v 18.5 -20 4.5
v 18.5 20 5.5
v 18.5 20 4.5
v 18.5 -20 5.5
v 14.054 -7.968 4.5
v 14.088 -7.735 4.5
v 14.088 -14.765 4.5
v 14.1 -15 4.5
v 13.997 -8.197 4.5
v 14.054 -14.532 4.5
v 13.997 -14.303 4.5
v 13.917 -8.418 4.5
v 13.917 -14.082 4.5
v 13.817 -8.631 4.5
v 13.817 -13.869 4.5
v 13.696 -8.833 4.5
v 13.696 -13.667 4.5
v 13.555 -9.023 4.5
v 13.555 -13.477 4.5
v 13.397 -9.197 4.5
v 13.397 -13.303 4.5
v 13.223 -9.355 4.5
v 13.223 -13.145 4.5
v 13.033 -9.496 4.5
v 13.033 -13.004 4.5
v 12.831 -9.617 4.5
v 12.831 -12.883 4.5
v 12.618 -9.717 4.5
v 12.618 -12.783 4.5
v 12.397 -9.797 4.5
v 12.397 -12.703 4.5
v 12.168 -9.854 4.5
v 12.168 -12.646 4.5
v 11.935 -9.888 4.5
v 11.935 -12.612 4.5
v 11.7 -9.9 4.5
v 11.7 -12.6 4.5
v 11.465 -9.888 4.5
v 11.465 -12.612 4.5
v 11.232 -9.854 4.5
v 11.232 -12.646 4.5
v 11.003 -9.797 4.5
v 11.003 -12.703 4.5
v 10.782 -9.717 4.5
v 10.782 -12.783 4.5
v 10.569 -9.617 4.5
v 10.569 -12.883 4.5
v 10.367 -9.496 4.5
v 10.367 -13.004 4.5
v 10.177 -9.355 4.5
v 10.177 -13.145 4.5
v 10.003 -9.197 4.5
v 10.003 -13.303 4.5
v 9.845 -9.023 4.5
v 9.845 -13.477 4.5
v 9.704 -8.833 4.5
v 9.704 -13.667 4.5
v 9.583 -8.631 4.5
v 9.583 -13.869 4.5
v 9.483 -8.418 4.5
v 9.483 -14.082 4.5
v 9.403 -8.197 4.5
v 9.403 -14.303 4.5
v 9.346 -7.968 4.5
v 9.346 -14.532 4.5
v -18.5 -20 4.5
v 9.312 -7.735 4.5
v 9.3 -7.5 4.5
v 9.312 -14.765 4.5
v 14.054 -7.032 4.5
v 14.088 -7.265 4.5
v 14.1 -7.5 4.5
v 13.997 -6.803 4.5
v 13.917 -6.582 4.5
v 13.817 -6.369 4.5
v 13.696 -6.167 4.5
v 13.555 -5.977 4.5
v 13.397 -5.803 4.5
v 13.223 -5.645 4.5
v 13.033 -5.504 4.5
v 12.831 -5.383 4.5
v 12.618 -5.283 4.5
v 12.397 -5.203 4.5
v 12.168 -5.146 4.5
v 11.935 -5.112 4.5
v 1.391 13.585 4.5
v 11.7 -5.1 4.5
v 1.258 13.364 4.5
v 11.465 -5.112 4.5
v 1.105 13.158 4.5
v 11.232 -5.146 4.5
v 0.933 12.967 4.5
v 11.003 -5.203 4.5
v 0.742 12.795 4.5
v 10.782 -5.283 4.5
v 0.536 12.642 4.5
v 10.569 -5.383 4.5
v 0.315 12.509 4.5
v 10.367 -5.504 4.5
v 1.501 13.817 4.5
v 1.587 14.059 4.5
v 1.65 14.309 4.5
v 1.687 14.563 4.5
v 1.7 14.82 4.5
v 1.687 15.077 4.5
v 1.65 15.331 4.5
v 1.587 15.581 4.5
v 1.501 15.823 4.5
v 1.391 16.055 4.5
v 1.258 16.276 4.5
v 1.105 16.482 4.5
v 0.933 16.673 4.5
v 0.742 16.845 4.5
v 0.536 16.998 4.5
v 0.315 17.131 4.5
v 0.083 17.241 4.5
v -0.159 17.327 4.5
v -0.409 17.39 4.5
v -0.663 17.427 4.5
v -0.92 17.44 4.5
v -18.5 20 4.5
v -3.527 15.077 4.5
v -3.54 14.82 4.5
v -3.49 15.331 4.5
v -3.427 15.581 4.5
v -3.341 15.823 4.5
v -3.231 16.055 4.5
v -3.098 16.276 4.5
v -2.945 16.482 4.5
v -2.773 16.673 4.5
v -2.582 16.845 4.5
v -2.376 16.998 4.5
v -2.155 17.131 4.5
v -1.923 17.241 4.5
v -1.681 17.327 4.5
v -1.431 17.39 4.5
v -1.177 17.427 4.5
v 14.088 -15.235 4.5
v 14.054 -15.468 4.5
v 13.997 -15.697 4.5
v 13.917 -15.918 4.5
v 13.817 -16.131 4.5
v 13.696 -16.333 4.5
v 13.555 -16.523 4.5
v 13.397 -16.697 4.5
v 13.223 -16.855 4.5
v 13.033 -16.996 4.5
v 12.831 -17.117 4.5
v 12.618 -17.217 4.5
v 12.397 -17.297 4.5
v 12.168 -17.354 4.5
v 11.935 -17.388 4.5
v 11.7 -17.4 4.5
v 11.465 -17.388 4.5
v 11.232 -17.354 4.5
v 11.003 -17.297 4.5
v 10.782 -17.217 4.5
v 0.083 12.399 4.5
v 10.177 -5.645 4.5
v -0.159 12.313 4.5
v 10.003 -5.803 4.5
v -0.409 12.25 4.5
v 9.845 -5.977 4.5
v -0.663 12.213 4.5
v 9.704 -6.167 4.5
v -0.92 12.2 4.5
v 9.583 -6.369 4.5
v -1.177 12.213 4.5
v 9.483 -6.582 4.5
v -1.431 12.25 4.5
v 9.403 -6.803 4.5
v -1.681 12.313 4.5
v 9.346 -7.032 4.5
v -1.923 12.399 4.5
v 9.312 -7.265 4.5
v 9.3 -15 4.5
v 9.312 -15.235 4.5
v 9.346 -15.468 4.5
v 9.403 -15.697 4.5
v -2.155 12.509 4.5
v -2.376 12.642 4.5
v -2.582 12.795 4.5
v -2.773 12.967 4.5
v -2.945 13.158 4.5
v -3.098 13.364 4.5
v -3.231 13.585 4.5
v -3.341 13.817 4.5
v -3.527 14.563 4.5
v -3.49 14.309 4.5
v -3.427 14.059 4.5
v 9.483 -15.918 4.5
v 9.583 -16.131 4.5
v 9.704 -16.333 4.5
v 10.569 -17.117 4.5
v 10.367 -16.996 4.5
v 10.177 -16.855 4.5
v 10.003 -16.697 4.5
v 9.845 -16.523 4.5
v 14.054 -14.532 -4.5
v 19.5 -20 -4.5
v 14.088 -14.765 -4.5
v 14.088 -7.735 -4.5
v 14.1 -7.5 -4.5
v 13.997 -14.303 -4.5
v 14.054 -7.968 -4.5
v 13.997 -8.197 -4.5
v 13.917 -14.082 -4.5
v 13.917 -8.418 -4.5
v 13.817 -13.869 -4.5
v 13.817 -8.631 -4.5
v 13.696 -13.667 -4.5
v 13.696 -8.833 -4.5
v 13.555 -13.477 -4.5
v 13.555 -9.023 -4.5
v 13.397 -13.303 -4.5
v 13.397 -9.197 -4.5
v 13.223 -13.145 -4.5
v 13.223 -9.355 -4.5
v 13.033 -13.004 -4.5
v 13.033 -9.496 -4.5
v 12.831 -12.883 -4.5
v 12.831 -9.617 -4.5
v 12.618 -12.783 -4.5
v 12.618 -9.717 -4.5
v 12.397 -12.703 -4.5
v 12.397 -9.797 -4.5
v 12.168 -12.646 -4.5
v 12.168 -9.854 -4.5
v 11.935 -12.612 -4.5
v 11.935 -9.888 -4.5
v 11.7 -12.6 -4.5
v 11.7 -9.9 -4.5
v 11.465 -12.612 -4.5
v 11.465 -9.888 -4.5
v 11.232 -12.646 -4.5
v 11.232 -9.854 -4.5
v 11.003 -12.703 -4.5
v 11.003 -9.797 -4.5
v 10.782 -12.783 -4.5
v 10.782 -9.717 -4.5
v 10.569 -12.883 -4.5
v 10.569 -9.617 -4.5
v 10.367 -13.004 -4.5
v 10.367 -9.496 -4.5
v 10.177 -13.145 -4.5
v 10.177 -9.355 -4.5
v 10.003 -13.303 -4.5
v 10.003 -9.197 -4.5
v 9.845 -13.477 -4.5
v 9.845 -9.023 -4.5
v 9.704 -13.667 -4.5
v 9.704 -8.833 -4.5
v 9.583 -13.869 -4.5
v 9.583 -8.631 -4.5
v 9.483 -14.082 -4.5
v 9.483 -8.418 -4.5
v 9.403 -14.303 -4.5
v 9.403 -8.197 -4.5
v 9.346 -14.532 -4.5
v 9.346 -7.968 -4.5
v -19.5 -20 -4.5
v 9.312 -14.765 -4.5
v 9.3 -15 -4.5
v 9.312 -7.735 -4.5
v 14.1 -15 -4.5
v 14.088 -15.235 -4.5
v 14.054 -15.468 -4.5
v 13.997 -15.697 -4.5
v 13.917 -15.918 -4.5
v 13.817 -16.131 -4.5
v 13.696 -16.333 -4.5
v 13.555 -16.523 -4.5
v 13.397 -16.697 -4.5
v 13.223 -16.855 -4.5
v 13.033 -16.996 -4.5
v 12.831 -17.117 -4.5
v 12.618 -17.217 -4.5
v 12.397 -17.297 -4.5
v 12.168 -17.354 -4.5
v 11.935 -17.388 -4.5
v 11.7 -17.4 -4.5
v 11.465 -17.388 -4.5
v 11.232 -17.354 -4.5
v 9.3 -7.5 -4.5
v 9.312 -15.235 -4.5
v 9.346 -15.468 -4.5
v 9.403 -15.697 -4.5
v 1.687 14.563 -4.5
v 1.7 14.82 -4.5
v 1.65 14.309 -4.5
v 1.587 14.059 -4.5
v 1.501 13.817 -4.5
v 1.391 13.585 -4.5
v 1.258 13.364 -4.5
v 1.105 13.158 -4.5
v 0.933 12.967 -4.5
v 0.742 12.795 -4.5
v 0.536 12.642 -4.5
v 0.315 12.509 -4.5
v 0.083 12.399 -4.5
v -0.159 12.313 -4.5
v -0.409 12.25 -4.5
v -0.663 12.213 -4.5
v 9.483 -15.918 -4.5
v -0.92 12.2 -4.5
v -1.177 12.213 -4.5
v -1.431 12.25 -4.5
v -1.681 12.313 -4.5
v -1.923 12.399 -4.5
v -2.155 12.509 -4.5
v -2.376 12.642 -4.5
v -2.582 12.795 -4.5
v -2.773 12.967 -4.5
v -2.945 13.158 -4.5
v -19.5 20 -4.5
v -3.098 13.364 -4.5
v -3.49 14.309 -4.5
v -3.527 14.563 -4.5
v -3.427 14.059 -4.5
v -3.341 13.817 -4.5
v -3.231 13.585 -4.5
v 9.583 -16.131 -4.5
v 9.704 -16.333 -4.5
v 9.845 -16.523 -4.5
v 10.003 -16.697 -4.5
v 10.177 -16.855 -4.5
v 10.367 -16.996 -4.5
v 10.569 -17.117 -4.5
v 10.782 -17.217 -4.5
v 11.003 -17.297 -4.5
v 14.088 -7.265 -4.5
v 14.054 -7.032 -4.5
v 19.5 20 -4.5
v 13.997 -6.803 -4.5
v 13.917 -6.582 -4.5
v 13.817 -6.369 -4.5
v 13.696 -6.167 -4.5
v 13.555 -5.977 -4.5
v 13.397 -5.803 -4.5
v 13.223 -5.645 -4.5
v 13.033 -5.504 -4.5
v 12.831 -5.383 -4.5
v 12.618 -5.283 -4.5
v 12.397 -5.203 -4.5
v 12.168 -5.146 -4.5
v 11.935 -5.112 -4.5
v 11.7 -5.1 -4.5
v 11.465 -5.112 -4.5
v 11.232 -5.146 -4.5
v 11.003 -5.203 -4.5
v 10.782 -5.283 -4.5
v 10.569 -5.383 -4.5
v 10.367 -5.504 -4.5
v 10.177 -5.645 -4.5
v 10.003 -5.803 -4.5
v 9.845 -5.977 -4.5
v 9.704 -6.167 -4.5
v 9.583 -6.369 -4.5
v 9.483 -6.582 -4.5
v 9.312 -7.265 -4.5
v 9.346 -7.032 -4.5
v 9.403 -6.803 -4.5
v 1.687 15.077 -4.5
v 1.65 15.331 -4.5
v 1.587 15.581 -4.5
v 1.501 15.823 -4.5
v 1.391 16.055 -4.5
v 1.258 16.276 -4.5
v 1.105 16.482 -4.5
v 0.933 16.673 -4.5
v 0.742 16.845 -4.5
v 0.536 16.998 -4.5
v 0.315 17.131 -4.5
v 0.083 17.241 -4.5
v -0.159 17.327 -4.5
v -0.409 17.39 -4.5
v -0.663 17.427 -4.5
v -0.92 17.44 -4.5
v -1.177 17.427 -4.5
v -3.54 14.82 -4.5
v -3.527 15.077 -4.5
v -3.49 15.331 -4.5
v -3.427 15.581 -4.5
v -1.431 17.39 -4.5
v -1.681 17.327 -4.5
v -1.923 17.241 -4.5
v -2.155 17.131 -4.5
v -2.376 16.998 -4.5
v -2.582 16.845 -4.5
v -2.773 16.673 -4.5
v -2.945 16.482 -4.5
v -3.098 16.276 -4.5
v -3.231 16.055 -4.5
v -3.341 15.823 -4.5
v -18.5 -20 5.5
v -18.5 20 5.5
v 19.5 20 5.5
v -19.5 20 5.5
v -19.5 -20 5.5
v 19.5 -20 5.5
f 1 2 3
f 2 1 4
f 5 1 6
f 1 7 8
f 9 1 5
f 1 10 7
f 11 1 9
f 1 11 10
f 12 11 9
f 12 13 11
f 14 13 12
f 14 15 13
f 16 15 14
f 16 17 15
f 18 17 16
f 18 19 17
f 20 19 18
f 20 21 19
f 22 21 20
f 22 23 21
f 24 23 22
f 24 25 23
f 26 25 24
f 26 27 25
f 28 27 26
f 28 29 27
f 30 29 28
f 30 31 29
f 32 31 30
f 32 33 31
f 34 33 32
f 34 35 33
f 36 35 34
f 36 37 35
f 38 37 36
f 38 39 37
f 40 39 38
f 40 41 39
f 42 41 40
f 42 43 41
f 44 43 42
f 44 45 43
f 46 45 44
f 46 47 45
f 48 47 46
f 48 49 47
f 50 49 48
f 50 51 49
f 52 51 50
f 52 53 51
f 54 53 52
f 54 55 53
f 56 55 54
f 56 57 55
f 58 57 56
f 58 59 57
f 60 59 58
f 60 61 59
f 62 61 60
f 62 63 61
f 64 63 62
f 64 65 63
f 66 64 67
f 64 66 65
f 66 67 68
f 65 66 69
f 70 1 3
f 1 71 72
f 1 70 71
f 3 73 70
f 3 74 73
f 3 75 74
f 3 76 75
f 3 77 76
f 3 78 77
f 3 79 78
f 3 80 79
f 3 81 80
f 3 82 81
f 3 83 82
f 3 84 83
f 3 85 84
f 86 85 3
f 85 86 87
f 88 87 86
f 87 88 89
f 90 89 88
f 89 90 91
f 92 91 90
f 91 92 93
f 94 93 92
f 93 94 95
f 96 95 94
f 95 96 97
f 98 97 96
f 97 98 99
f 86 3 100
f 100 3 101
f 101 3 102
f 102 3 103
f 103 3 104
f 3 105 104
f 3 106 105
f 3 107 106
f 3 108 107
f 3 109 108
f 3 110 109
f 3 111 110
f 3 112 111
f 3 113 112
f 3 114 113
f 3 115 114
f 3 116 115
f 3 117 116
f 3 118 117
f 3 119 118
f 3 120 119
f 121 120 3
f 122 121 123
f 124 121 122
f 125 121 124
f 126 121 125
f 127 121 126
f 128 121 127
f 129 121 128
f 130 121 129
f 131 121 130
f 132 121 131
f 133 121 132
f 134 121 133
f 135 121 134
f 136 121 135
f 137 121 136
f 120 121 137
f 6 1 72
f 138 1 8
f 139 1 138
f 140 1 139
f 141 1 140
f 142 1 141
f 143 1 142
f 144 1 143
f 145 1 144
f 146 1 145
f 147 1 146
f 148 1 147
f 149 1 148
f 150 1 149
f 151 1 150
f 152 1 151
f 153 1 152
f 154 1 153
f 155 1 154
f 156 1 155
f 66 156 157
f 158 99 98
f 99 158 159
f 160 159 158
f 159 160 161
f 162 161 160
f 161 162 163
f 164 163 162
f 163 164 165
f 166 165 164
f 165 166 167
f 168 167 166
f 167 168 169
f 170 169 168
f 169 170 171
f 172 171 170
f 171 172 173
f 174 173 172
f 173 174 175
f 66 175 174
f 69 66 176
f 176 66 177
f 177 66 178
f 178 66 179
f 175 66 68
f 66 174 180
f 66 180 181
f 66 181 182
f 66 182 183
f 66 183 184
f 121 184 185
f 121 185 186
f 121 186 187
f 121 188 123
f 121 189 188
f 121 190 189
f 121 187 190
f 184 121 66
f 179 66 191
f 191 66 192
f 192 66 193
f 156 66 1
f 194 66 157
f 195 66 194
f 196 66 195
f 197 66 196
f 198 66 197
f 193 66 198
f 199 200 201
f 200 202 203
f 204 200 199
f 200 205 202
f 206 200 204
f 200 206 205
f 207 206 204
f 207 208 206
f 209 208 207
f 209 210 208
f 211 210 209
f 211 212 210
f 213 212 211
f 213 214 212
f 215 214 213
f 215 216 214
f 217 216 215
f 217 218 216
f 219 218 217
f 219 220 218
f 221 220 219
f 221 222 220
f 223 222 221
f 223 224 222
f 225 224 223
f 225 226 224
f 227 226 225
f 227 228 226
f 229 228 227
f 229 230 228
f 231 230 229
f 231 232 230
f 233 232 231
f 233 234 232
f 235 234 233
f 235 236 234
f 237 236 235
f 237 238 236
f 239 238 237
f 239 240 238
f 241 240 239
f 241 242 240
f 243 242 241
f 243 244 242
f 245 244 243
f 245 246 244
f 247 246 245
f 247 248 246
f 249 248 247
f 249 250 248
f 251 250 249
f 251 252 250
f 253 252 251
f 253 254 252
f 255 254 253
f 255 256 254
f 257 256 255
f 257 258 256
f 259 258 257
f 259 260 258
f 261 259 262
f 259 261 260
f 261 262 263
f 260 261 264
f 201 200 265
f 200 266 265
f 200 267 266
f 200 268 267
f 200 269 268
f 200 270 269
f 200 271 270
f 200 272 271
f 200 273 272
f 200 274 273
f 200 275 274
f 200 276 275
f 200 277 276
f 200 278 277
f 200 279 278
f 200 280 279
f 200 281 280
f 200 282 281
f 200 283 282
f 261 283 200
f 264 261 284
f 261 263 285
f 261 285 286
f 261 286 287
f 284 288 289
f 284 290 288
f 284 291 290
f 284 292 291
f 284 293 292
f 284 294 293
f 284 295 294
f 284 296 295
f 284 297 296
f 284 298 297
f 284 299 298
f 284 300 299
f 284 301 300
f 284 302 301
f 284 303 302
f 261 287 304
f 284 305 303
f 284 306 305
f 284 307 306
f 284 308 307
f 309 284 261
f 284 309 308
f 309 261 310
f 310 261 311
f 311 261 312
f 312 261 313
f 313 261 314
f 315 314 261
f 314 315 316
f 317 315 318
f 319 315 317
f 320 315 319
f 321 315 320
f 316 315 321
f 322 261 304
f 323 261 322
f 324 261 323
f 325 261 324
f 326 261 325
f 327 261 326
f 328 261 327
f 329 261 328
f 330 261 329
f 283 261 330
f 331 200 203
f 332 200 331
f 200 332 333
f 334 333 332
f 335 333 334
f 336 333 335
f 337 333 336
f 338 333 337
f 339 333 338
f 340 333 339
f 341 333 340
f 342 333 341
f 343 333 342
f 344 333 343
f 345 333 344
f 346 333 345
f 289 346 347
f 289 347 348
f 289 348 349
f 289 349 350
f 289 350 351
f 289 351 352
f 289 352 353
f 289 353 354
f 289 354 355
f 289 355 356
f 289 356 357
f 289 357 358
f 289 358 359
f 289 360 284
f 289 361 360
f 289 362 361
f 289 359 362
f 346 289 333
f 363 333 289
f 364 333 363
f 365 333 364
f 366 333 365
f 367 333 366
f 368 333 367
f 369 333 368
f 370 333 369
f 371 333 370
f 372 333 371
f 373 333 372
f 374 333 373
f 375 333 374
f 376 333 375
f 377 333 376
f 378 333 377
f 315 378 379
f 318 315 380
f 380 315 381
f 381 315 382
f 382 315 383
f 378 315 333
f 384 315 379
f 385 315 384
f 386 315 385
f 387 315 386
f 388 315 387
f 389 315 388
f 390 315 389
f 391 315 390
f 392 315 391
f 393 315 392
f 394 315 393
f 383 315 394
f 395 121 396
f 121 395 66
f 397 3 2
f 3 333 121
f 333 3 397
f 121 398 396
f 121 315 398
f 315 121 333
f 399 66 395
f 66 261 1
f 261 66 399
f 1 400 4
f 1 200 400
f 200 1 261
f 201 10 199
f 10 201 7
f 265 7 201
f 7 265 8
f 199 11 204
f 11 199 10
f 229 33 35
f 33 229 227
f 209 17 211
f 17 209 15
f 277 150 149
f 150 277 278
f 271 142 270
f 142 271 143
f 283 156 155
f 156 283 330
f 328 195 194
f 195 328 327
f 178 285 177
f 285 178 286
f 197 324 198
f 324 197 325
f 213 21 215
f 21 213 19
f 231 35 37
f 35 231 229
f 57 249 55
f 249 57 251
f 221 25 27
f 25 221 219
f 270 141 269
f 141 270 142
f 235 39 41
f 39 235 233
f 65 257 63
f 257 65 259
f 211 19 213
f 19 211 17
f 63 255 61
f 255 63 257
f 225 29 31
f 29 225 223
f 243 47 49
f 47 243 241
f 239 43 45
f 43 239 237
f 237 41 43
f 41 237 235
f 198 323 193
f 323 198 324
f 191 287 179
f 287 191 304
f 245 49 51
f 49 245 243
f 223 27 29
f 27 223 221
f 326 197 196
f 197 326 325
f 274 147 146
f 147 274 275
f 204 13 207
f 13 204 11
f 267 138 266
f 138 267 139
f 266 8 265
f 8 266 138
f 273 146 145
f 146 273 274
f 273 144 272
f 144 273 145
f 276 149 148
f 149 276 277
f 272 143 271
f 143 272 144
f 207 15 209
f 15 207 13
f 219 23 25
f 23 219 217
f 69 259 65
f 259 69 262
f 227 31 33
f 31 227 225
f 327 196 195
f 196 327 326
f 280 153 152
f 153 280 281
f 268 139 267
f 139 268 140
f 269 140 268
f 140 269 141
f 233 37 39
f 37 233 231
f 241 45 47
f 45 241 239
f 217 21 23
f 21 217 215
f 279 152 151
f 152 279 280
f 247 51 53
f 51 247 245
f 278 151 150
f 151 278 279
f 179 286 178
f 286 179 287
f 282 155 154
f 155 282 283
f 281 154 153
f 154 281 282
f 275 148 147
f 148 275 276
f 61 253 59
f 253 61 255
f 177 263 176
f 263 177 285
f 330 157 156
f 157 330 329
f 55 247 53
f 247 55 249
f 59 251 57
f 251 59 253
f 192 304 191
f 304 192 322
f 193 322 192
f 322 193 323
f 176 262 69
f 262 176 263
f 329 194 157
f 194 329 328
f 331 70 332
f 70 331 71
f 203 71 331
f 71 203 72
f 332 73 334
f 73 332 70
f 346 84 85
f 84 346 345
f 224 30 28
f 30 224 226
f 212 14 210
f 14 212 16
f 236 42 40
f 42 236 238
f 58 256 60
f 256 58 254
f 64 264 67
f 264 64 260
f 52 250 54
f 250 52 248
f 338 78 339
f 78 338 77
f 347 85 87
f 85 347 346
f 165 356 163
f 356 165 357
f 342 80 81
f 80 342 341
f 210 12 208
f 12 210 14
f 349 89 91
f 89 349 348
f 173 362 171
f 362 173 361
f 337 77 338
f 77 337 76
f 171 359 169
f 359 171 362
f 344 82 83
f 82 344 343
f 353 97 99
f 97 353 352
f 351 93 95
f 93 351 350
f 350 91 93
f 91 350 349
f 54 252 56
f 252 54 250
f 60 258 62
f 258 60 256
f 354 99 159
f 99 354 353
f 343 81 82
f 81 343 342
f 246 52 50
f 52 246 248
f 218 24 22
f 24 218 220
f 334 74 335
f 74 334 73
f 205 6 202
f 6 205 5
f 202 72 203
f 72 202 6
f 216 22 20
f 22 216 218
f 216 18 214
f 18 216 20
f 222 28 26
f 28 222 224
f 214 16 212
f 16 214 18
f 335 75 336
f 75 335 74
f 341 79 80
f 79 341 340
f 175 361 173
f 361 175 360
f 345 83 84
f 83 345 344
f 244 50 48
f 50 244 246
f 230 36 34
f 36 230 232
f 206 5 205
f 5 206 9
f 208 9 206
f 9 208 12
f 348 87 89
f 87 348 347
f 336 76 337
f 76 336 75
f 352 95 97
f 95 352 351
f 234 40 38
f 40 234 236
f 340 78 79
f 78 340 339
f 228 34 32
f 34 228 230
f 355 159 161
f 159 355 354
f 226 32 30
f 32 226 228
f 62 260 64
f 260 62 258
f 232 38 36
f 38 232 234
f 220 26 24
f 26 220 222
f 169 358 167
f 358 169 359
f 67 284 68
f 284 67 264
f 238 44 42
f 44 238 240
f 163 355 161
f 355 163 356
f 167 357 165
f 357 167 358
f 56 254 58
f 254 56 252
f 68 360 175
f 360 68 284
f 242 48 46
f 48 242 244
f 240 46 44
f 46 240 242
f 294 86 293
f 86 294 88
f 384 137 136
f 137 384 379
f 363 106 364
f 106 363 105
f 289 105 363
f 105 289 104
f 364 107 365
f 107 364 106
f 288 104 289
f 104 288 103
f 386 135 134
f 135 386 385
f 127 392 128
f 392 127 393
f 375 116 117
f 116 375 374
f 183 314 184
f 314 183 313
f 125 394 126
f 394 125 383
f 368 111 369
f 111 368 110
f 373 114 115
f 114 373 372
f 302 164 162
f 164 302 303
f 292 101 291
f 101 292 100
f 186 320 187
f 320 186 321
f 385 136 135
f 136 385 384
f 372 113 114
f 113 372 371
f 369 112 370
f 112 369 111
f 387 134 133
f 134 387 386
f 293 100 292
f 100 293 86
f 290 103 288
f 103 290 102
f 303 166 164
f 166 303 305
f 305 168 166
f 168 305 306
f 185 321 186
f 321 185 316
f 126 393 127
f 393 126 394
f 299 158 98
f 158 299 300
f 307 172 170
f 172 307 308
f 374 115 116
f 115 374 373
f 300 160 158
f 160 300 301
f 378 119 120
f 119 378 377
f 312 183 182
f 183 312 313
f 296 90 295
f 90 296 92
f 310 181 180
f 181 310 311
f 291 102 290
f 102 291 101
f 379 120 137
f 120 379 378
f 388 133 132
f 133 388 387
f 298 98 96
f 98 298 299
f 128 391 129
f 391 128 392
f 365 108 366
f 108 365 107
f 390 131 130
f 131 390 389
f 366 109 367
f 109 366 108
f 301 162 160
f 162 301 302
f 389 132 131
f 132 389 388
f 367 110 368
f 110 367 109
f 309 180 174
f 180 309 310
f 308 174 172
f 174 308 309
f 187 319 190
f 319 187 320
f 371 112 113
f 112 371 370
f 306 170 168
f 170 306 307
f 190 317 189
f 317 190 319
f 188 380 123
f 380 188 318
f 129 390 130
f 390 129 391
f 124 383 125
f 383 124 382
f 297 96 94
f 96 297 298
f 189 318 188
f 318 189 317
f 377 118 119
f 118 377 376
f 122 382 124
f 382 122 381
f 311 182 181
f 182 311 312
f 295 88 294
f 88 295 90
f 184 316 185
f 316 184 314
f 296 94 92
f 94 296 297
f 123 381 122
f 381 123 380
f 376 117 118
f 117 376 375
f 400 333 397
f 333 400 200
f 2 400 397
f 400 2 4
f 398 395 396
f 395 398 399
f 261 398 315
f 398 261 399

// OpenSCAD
railX=37.0;
railY=40;
railZ=9;
holeD=4.8;
holeX=railX/2-6.8;
hole1Y=-railY/2+5;
hole2Y=-railY/2+12.5;
frameThickness=1;

guardholeD=5.24;
guardholeX=railX/2-(16.8+guardholeD/2);
guardholeY=-railY/2+(32.2+guardholeD/2);

module FRpegEverbuilt()
{
difference() {
    cube([railX,railY,railZ],center=true);
    translate([holeX,hole1Y,0])cylinder(d=holeD,h=railZ+0.01,$fn=64,center=true);
    translate([holeX,hole2Y,0])cylinder(d=holeD,h=railZ+0.01,$fn=64,center=true);
    translate([guardholeX,guardholeY,0])cylinder(d=guardholeD,h=railZ+0.01,$fn=64,center=true);
}

//Frame
translate([railX/2+frameThickness/2,0,frameThickness/2])cube([frameThickness,railY,railZ+frameThickness],center=true);
translate([-railX/2-frameThickness/2,0,frameThickness/2])cube([frameThickness,railY,railZ+frameThickness],center=true);

}

FRpegEverbuilt();
